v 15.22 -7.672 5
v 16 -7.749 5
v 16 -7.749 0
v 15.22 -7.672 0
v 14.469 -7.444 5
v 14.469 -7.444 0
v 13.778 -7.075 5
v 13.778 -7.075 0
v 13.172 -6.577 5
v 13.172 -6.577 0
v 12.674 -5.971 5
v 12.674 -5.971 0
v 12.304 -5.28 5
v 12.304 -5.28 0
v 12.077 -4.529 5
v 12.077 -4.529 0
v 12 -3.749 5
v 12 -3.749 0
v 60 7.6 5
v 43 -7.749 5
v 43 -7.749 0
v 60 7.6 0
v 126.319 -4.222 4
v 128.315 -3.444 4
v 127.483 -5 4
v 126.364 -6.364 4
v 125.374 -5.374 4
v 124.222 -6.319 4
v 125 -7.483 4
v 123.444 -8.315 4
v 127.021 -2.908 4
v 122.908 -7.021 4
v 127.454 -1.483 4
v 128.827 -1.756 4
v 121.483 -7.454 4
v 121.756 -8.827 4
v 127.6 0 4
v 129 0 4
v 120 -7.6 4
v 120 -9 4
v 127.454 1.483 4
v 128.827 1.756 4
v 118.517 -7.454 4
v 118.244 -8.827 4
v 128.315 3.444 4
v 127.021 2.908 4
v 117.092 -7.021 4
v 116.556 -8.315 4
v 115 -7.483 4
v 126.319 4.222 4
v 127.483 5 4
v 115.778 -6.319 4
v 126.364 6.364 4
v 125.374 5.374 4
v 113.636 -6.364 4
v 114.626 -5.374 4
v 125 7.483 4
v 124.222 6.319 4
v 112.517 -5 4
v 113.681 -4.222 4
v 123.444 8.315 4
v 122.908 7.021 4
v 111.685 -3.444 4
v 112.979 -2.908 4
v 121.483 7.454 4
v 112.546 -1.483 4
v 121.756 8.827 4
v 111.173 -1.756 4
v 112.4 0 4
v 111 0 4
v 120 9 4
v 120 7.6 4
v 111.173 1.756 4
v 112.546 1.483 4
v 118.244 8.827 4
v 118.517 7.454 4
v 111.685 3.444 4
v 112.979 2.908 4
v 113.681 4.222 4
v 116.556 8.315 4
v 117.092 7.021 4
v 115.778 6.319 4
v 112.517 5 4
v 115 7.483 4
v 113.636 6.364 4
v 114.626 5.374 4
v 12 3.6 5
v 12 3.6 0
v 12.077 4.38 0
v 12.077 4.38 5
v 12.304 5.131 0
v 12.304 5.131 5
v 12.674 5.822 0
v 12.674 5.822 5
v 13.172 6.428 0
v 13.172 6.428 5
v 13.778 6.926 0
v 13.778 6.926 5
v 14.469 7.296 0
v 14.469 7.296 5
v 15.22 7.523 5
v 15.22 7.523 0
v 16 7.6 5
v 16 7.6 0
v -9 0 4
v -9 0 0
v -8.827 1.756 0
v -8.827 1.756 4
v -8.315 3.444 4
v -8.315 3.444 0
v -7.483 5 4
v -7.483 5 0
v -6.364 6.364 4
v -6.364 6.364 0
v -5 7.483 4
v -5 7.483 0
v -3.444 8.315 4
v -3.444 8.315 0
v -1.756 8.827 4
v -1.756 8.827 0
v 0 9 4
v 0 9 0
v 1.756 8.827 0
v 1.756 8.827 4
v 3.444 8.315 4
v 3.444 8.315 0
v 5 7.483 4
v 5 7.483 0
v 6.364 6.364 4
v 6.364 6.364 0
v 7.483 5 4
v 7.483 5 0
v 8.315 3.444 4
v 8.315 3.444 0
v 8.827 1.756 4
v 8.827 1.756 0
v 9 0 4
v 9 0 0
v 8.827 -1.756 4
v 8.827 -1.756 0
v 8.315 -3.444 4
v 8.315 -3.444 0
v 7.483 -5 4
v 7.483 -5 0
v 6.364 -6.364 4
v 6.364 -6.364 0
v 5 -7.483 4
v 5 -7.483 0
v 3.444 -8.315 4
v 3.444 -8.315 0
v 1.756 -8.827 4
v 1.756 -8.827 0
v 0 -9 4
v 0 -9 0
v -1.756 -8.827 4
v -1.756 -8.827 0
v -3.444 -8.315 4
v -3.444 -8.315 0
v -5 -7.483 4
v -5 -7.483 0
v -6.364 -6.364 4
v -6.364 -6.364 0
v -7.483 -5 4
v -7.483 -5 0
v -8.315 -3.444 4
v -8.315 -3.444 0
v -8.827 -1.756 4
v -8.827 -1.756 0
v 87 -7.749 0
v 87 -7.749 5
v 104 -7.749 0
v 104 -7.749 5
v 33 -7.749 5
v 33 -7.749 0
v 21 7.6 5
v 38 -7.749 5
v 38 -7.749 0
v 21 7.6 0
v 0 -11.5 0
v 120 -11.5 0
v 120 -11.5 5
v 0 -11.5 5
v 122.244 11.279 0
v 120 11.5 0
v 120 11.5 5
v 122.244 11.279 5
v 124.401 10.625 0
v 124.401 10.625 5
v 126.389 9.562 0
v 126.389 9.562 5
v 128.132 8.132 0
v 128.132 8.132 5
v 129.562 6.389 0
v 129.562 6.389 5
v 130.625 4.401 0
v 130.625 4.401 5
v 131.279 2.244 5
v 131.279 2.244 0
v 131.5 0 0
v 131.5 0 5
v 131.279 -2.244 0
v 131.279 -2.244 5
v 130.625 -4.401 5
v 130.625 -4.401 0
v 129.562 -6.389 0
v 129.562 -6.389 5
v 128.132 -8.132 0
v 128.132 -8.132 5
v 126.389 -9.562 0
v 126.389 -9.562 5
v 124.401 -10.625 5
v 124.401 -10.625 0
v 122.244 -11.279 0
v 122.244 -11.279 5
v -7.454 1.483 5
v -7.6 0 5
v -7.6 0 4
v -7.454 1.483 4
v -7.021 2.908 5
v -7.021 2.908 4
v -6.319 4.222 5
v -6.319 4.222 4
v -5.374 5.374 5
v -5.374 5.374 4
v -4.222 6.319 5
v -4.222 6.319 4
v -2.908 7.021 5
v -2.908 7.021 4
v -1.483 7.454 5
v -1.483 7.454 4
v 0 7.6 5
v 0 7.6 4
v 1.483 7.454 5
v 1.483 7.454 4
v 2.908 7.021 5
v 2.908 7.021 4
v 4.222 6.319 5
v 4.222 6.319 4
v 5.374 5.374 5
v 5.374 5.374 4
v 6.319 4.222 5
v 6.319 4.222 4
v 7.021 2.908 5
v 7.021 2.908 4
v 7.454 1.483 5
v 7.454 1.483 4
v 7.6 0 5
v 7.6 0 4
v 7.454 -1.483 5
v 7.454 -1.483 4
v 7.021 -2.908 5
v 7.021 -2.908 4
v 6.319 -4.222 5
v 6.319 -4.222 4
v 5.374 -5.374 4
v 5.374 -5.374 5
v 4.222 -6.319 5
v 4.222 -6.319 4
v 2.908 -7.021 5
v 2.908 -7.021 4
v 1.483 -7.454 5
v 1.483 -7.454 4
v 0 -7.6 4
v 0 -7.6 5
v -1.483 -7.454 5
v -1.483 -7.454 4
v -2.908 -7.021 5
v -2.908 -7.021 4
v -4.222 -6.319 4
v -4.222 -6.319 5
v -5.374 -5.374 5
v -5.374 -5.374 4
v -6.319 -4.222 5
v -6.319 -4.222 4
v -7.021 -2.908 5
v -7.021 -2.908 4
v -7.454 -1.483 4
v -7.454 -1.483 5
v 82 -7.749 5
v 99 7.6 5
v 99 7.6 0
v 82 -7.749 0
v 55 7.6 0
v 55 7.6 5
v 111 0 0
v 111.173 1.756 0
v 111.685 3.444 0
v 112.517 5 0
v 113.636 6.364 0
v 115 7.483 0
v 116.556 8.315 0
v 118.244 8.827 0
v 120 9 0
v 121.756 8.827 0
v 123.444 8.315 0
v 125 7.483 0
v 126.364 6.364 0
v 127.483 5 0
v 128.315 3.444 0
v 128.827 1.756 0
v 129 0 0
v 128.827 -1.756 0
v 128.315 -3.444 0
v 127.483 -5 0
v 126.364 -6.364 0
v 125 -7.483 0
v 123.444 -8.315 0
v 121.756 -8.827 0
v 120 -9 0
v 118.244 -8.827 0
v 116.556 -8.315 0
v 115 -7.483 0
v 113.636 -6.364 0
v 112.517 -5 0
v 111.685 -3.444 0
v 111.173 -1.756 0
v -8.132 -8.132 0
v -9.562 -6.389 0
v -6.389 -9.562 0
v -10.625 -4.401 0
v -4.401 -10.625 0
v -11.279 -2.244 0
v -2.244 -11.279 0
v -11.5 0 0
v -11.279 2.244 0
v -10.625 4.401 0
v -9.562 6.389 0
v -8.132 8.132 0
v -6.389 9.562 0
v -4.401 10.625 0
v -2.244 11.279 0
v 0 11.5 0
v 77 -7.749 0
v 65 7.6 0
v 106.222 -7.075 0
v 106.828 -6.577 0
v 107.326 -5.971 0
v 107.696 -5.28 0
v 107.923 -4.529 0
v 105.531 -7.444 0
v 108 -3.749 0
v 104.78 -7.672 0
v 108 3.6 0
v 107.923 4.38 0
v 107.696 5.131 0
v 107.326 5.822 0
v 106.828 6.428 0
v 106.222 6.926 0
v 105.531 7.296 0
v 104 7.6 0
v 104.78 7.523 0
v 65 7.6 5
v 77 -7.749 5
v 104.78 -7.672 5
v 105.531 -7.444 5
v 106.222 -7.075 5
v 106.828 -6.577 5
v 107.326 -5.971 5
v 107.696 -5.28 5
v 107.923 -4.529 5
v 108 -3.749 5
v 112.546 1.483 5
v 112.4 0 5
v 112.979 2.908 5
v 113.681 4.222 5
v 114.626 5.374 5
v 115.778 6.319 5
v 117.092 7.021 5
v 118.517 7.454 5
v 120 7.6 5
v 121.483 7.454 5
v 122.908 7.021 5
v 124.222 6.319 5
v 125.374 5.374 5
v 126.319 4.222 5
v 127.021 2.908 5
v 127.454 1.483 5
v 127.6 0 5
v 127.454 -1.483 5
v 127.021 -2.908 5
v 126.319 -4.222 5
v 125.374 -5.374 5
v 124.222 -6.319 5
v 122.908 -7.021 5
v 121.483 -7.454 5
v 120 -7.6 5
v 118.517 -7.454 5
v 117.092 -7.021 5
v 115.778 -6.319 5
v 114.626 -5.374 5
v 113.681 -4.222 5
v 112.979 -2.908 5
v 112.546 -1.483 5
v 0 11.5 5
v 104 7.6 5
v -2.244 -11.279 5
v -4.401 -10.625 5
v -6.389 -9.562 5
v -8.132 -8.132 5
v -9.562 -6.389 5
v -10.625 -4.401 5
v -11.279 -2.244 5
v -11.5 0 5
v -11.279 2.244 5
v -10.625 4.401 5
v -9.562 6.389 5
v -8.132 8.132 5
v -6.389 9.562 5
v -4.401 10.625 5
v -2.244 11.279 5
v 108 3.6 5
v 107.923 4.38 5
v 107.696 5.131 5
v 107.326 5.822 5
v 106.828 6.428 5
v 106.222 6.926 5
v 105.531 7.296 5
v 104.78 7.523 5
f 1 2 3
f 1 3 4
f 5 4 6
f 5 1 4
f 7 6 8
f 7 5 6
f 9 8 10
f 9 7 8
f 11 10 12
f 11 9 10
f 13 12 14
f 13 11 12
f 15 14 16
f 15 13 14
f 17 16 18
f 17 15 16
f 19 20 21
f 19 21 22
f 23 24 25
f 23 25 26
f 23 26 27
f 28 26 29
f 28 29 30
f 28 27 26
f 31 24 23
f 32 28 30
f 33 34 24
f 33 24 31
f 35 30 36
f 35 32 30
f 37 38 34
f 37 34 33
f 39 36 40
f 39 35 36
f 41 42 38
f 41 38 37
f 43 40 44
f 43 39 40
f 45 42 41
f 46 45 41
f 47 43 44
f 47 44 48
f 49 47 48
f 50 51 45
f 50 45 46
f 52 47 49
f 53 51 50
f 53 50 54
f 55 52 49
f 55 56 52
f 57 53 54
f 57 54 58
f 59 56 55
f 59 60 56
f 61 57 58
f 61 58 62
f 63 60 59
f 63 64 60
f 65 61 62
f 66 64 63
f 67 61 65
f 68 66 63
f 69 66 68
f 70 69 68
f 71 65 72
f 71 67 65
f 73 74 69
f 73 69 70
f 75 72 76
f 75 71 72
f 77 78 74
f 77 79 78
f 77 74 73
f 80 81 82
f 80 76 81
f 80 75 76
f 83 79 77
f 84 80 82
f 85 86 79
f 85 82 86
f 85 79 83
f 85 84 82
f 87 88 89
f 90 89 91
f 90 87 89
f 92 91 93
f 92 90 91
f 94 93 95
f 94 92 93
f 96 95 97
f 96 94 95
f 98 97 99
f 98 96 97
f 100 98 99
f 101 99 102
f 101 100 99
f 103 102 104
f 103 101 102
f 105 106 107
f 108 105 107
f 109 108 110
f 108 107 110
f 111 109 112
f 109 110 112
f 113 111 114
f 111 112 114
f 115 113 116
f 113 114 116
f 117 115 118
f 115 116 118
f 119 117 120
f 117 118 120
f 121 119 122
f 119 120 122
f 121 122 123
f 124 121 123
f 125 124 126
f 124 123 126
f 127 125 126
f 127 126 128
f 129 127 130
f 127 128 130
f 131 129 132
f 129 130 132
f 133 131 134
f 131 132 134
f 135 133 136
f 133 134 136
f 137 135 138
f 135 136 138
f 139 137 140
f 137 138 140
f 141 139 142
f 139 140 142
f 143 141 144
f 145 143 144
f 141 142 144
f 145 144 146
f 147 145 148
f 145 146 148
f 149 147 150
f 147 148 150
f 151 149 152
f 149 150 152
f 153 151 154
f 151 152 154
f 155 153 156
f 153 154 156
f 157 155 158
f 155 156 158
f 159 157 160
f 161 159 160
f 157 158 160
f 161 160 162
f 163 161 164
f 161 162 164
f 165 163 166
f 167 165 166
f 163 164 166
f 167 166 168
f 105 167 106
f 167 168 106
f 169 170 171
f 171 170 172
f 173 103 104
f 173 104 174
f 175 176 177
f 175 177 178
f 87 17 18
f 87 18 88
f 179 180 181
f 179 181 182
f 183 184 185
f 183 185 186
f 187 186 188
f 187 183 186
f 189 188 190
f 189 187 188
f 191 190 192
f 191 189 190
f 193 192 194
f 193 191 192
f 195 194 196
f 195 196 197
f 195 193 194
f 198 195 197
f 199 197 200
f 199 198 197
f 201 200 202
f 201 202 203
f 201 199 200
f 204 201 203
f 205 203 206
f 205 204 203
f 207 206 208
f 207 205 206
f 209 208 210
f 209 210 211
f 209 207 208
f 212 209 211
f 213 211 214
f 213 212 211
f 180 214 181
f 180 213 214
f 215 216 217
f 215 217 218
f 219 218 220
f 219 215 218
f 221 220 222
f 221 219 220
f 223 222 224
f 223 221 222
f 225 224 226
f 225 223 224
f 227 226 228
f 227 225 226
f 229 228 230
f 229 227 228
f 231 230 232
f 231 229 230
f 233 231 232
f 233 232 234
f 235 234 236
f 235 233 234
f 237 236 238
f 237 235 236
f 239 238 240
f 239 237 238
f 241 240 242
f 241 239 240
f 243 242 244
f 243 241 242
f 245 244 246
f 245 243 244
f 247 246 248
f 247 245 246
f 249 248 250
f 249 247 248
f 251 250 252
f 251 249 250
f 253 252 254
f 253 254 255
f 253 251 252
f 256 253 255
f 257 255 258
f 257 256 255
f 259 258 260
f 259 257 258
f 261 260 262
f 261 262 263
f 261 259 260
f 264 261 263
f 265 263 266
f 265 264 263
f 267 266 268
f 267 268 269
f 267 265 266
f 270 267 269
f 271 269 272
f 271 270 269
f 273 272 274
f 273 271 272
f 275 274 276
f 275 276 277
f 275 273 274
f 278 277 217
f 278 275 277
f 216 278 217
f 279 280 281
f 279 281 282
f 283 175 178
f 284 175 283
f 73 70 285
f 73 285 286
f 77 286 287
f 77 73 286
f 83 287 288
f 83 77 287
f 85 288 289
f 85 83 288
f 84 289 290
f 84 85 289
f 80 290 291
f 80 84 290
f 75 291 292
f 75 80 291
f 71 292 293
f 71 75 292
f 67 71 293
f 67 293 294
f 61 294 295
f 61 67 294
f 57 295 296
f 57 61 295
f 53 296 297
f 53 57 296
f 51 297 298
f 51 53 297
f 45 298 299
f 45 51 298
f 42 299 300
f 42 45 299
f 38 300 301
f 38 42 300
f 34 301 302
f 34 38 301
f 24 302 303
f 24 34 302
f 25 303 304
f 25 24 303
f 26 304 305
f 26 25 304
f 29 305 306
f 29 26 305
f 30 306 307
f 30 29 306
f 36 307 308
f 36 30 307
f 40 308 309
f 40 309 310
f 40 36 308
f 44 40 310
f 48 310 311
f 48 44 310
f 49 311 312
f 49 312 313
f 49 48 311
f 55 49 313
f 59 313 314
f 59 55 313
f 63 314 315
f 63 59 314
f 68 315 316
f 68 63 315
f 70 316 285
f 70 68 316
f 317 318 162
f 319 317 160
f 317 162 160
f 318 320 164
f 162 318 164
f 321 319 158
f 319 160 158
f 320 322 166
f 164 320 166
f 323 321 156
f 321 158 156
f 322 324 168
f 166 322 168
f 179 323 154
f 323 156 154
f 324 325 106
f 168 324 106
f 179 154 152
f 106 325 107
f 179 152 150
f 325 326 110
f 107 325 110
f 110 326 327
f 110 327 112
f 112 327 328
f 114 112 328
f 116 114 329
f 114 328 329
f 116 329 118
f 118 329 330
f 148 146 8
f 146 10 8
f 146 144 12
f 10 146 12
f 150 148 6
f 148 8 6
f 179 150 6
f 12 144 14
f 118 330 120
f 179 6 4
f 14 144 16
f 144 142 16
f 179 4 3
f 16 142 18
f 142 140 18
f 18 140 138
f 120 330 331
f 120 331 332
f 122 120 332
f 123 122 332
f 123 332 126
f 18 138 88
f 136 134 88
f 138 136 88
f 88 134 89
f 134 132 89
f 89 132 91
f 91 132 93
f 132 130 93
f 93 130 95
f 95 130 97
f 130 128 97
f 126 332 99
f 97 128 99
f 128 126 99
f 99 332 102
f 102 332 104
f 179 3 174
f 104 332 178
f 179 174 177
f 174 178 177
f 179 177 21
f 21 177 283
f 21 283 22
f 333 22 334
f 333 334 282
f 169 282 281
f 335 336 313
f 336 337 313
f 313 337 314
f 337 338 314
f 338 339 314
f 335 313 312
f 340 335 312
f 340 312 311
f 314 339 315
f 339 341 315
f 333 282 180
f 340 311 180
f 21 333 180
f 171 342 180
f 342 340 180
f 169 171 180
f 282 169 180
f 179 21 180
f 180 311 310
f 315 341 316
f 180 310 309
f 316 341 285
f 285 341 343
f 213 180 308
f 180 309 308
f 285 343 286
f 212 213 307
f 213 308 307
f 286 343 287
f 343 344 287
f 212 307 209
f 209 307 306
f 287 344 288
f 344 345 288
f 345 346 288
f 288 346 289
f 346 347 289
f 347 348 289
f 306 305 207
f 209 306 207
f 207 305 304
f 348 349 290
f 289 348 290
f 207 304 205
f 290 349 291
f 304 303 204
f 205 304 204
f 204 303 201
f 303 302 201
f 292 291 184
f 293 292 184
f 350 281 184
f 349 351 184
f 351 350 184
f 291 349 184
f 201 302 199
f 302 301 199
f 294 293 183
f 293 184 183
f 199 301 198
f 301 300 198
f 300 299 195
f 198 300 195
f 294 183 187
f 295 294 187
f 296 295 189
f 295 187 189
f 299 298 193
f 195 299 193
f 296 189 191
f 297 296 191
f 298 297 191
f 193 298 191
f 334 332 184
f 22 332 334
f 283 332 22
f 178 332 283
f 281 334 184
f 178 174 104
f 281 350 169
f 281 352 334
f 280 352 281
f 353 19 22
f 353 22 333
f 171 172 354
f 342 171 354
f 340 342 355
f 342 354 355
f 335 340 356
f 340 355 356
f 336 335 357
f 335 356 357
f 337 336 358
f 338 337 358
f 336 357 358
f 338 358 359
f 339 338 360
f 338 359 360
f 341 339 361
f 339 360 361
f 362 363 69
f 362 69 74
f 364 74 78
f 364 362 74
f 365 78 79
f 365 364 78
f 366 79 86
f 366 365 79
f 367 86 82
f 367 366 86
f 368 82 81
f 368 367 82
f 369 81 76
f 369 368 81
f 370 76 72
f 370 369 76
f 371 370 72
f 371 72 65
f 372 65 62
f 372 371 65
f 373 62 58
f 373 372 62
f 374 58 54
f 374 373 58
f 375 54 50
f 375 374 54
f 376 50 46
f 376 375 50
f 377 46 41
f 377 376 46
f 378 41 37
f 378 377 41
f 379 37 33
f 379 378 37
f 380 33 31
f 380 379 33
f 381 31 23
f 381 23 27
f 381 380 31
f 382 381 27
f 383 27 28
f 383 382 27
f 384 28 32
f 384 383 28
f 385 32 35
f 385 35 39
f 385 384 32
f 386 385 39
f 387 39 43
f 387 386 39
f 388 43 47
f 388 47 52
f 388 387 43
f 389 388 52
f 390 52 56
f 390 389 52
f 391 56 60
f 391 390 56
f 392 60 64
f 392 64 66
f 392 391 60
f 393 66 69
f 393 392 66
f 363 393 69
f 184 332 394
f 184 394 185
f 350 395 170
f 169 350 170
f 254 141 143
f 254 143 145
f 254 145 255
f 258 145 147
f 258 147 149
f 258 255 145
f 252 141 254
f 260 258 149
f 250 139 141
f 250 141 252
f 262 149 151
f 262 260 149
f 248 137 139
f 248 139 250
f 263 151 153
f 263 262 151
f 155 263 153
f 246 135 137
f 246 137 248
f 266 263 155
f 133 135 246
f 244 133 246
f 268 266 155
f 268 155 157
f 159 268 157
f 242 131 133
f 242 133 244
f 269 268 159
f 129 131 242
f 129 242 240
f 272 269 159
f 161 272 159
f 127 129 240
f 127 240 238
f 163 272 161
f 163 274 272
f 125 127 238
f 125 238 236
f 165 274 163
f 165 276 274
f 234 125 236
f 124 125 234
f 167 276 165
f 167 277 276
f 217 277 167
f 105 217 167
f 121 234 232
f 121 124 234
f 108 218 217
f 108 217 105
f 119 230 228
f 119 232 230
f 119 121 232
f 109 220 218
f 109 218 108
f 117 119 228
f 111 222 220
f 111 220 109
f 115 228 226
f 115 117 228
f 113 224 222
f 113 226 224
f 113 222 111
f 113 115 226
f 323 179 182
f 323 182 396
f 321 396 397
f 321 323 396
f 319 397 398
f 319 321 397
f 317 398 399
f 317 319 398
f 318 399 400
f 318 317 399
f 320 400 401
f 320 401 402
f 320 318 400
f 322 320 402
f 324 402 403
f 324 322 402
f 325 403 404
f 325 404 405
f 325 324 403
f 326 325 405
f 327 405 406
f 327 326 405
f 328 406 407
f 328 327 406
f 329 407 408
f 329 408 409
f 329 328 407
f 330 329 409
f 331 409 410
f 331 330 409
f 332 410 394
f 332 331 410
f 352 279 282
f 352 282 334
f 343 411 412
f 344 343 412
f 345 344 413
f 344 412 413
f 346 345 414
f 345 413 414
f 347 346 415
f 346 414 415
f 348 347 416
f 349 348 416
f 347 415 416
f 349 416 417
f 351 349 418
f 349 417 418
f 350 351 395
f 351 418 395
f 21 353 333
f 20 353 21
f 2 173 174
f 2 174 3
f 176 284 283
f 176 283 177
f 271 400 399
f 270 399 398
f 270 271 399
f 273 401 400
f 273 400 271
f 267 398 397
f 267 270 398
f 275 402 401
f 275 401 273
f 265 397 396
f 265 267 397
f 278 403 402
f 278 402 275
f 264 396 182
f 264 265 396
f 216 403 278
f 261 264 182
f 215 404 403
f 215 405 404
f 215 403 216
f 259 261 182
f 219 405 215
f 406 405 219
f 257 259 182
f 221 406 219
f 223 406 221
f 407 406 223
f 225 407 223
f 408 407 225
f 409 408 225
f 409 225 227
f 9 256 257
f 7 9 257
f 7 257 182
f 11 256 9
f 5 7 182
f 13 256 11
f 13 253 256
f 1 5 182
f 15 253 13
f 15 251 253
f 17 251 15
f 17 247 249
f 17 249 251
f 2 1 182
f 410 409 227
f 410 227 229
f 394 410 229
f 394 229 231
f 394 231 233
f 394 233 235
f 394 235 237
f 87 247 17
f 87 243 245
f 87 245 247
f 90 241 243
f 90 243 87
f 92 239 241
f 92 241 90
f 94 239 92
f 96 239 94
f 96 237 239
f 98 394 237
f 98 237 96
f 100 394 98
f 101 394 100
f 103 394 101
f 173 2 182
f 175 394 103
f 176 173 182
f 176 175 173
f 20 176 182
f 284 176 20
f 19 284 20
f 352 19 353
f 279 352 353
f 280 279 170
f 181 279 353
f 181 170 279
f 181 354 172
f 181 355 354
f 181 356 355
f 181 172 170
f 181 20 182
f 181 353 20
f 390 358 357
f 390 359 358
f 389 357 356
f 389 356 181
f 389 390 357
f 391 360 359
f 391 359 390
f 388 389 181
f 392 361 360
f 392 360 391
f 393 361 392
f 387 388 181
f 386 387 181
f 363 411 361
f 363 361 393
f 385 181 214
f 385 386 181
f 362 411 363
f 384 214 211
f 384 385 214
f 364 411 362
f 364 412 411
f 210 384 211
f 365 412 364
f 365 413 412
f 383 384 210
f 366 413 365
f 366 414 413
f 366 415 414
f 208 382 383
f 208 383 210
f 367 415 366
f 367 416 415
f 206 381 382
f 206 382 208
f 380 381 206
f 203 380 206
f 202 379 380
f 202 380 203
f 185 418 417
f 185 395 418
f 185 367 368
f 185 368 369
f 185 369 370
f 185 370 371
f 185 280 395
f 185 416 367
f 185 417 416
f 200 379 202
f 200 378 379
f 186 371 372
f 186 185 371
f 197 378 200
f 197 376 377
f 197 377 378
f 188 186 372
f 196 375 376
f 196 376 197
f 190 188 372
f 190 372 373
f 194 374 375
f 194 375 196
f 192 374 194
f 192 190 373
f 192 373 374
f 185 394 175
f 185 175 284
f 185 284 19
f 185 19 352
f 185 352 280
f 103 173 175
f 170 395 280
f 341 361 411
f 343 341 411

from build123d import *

# Parameters (mm, degrees)
BOSS_EXTRUDE3_DEPTH     = 5
SKETCH6_R               = 9
CUT_EXTRUDE3_DEPTH      = 4
BOSS_EXTRUDE4_START     = -1
BOSS_EXTRUDE4_OUTLINE_R = 7.6
BOSS_EXTRUDE4_DEPTH     = 1
BOSS_EXTRUDE5_START     = -4
BOSS_EXTRUDE5_OUTLINE_R = 9
BOSS_EXTRUDE5_DEPTH     = 4
BOSS_EXTRUDE6_START     = -1
BOSS_EXTRUDE6_OUTLINE_R = 7.6
BOSS_EXTRUDE6_DEPTH     = 1
CUT_EXTRUDE8_DEPTH      = 20
BOSS_EXTRUDE8_DEPTH     = 5
BOSS_EXTRUDE9_DEPTH     = 5
CUT_EXTRUDE10_DEPTH     = 10


# Read off the part's stored shape, not the designer's step: Boss-Extrude4, Boss-Extrude5, Boss-Extrude6
with BuildPart() as part:
    # Sketch5 → Boss-Extrude3 (new body)
    with BuildSketch(Plane.XY):
        with BuildLine():
            Line((0, 11.5), (120, 11.5))
            ThreePointArc((120, 11.5), (131.5, 0), (120, -11.5))
            Line((120, -11.5), (0, -11.5))
            ThreePointArc((0, -11.5), (-11.5, 0), (0, 11.5))
        make_face()
    extrude(amount=BOSS_EXTRUDE3_DEPTH)

    # Sketch6 → Cut-Extrude3 (cut)
    with BuildSketch(Plane(origin=(0, 0, 0), x_dir=(-1, 0, 0), z_dir=(0, 0, -1))):
        Circle(SKETCH6_R)
    extrude(amount=-CUT_EXTRUDE3_DEPTH, mode=Mode.SUBTRACT)

    # Boss-Extrude4 outline → Boss-Extrude4 (cut)
    with BuildSketch(Plane(origin=(0, 0, 4), x_dir=(-1, 0, 0), z_dir=(0, 0, -1)).offset(BOSS_EXTRUDE4_START)):
        Circle(BOSS_EXTRUDE4_OUTLINE_R)
    extrude(amount=BOSS_EXTRUDE4_DEPTH, mode=Mode.SUBTRACT)

    # Boss-Extrude5 outline → Boss-Extrude5 (cut)
    with BuildSketch(Plane(origin=(0, 0, 0), x_dir=(-1, 0, 0), z_dir=(0, 0, -1)).offset(BOSS_EXTRUDE5_START)):
        with Locations((-120, 0)):
            Circle(BOSS_EXTRUDE5_OUTLINE_R)
    extrude(amount=BOSS_EXTRUDE5_DEPTH, mode=Mode.SUBTRACT)

    # Boss-Extrude6 outline → Boss-Extrude6 (cut)
    with BuildSketch(Plane(origin=(0, 0, 4), x_dir=(-1, 0, 0), z_dir=(0, 0, -1)).offset(BOSS_EXTRUDE6_START)):
        with Locations((-120, 0)):
            Circle(BOSS_EXTRUDE6_OUTLINE_R)
    extrude(amount=BOSS_EXTRUDE6_DEPTH, mode=Mode.SUBTRACT)

    # Sketch12 → Cut-Extrude8 (cut)
    with BuildSketch(Plane.XY.offset(5)):
        with BuildLine():
            Line((16, 7.6), (104, 7.6))
            ThreePointArc((104, 7.6), (106.828427125, 6.428427125), (108, 3.6))
            Line((108, 3.6), (108, -3.748914736))
            ThreePointArc((108, -3.748914736), (106.828427125, -6.577341861), (104, -7.748914736))
            Line((104, -7.748914736), (16, -7.748914736))
            ThreePointArc((16, -7.748914736), (13.171572875, -6.577341861), (12, -3.748914736))
            Line((12, -3.748914736), (12, 3.6))
            ThreePointArc((12, 3.6), (13.171572875, 6.428427125), (16, 7.6))
        make_face()
    extrude(amount=-CUT_EXTRUDE8_DEPTH, mode=Mode.SUBTRACT)

    # Sketch12<10> → Boss-Extrude8 (add)
    with BuildSketch(Plane.XY.offset(5)):
        Polygon((38, -7.748914736), (21, 7.6), (16, 7.6), (33, -7.748914736), align=None)
        Polygon((60, 7.6), (55, 7.6), (38, -7.748914736), (43, -7.748914736), align=None)
        Polygon((65, 7.6), (60, 7.6), (77, -7.748914736), (82, -7.748914736), align=None)
        Polygon((104, 7.6), (99, 7.6), (82, -7.748914736), (87, -7.748914736), align=None)
    extrude(amount=-BOSS_EXTRUDE8_DEPTH)

    # Sketch12<11> → Boss-Extrude9 (add)
    with BuildSketch(Plane.XY.offset(5)):
        with BuildLine():
            ThreePointArc((108, 3.6), (106.828427125, 6.428427125), (104, 7.6))
            Line((104, 7.6), (87, -7.748914736))
            Line((87, -7.748914736), (104, -7.748914736))
            ThreePointArc((104, -7.748914736), (106.828427125, -6.577341861), (108, -3.748914736))
            Line((108, -3.748914736), (108, 3.6))
        make_face()
    extrude(amount=-BOSS_EXTRUDE9_DEPTH)

    # Sketch12<14> → Cut-Extrude10 (cut)
    with BuildSketch(Plane.XY.offset(5)):
        with BuildLine():
            ThreePointArc((108, 3.6), (106.828427125, 6.428427125), (104, 7.6))
            Line((104, 7.6), (87, -7.748914736))
            Line((87, -7.748914736), (104, -7.748914736))
            ThreePointArc((104, -7.748914736), (106.828427125, -6.577341861), (108, -3.748914736))
            Line((108, -3.748914736), (108, 3.6))
        make_face()
    extrude(amount=-CUT_EXTRUDE10_DEPTH, mode=Mode.SUBTRACT)


solid = part.part
